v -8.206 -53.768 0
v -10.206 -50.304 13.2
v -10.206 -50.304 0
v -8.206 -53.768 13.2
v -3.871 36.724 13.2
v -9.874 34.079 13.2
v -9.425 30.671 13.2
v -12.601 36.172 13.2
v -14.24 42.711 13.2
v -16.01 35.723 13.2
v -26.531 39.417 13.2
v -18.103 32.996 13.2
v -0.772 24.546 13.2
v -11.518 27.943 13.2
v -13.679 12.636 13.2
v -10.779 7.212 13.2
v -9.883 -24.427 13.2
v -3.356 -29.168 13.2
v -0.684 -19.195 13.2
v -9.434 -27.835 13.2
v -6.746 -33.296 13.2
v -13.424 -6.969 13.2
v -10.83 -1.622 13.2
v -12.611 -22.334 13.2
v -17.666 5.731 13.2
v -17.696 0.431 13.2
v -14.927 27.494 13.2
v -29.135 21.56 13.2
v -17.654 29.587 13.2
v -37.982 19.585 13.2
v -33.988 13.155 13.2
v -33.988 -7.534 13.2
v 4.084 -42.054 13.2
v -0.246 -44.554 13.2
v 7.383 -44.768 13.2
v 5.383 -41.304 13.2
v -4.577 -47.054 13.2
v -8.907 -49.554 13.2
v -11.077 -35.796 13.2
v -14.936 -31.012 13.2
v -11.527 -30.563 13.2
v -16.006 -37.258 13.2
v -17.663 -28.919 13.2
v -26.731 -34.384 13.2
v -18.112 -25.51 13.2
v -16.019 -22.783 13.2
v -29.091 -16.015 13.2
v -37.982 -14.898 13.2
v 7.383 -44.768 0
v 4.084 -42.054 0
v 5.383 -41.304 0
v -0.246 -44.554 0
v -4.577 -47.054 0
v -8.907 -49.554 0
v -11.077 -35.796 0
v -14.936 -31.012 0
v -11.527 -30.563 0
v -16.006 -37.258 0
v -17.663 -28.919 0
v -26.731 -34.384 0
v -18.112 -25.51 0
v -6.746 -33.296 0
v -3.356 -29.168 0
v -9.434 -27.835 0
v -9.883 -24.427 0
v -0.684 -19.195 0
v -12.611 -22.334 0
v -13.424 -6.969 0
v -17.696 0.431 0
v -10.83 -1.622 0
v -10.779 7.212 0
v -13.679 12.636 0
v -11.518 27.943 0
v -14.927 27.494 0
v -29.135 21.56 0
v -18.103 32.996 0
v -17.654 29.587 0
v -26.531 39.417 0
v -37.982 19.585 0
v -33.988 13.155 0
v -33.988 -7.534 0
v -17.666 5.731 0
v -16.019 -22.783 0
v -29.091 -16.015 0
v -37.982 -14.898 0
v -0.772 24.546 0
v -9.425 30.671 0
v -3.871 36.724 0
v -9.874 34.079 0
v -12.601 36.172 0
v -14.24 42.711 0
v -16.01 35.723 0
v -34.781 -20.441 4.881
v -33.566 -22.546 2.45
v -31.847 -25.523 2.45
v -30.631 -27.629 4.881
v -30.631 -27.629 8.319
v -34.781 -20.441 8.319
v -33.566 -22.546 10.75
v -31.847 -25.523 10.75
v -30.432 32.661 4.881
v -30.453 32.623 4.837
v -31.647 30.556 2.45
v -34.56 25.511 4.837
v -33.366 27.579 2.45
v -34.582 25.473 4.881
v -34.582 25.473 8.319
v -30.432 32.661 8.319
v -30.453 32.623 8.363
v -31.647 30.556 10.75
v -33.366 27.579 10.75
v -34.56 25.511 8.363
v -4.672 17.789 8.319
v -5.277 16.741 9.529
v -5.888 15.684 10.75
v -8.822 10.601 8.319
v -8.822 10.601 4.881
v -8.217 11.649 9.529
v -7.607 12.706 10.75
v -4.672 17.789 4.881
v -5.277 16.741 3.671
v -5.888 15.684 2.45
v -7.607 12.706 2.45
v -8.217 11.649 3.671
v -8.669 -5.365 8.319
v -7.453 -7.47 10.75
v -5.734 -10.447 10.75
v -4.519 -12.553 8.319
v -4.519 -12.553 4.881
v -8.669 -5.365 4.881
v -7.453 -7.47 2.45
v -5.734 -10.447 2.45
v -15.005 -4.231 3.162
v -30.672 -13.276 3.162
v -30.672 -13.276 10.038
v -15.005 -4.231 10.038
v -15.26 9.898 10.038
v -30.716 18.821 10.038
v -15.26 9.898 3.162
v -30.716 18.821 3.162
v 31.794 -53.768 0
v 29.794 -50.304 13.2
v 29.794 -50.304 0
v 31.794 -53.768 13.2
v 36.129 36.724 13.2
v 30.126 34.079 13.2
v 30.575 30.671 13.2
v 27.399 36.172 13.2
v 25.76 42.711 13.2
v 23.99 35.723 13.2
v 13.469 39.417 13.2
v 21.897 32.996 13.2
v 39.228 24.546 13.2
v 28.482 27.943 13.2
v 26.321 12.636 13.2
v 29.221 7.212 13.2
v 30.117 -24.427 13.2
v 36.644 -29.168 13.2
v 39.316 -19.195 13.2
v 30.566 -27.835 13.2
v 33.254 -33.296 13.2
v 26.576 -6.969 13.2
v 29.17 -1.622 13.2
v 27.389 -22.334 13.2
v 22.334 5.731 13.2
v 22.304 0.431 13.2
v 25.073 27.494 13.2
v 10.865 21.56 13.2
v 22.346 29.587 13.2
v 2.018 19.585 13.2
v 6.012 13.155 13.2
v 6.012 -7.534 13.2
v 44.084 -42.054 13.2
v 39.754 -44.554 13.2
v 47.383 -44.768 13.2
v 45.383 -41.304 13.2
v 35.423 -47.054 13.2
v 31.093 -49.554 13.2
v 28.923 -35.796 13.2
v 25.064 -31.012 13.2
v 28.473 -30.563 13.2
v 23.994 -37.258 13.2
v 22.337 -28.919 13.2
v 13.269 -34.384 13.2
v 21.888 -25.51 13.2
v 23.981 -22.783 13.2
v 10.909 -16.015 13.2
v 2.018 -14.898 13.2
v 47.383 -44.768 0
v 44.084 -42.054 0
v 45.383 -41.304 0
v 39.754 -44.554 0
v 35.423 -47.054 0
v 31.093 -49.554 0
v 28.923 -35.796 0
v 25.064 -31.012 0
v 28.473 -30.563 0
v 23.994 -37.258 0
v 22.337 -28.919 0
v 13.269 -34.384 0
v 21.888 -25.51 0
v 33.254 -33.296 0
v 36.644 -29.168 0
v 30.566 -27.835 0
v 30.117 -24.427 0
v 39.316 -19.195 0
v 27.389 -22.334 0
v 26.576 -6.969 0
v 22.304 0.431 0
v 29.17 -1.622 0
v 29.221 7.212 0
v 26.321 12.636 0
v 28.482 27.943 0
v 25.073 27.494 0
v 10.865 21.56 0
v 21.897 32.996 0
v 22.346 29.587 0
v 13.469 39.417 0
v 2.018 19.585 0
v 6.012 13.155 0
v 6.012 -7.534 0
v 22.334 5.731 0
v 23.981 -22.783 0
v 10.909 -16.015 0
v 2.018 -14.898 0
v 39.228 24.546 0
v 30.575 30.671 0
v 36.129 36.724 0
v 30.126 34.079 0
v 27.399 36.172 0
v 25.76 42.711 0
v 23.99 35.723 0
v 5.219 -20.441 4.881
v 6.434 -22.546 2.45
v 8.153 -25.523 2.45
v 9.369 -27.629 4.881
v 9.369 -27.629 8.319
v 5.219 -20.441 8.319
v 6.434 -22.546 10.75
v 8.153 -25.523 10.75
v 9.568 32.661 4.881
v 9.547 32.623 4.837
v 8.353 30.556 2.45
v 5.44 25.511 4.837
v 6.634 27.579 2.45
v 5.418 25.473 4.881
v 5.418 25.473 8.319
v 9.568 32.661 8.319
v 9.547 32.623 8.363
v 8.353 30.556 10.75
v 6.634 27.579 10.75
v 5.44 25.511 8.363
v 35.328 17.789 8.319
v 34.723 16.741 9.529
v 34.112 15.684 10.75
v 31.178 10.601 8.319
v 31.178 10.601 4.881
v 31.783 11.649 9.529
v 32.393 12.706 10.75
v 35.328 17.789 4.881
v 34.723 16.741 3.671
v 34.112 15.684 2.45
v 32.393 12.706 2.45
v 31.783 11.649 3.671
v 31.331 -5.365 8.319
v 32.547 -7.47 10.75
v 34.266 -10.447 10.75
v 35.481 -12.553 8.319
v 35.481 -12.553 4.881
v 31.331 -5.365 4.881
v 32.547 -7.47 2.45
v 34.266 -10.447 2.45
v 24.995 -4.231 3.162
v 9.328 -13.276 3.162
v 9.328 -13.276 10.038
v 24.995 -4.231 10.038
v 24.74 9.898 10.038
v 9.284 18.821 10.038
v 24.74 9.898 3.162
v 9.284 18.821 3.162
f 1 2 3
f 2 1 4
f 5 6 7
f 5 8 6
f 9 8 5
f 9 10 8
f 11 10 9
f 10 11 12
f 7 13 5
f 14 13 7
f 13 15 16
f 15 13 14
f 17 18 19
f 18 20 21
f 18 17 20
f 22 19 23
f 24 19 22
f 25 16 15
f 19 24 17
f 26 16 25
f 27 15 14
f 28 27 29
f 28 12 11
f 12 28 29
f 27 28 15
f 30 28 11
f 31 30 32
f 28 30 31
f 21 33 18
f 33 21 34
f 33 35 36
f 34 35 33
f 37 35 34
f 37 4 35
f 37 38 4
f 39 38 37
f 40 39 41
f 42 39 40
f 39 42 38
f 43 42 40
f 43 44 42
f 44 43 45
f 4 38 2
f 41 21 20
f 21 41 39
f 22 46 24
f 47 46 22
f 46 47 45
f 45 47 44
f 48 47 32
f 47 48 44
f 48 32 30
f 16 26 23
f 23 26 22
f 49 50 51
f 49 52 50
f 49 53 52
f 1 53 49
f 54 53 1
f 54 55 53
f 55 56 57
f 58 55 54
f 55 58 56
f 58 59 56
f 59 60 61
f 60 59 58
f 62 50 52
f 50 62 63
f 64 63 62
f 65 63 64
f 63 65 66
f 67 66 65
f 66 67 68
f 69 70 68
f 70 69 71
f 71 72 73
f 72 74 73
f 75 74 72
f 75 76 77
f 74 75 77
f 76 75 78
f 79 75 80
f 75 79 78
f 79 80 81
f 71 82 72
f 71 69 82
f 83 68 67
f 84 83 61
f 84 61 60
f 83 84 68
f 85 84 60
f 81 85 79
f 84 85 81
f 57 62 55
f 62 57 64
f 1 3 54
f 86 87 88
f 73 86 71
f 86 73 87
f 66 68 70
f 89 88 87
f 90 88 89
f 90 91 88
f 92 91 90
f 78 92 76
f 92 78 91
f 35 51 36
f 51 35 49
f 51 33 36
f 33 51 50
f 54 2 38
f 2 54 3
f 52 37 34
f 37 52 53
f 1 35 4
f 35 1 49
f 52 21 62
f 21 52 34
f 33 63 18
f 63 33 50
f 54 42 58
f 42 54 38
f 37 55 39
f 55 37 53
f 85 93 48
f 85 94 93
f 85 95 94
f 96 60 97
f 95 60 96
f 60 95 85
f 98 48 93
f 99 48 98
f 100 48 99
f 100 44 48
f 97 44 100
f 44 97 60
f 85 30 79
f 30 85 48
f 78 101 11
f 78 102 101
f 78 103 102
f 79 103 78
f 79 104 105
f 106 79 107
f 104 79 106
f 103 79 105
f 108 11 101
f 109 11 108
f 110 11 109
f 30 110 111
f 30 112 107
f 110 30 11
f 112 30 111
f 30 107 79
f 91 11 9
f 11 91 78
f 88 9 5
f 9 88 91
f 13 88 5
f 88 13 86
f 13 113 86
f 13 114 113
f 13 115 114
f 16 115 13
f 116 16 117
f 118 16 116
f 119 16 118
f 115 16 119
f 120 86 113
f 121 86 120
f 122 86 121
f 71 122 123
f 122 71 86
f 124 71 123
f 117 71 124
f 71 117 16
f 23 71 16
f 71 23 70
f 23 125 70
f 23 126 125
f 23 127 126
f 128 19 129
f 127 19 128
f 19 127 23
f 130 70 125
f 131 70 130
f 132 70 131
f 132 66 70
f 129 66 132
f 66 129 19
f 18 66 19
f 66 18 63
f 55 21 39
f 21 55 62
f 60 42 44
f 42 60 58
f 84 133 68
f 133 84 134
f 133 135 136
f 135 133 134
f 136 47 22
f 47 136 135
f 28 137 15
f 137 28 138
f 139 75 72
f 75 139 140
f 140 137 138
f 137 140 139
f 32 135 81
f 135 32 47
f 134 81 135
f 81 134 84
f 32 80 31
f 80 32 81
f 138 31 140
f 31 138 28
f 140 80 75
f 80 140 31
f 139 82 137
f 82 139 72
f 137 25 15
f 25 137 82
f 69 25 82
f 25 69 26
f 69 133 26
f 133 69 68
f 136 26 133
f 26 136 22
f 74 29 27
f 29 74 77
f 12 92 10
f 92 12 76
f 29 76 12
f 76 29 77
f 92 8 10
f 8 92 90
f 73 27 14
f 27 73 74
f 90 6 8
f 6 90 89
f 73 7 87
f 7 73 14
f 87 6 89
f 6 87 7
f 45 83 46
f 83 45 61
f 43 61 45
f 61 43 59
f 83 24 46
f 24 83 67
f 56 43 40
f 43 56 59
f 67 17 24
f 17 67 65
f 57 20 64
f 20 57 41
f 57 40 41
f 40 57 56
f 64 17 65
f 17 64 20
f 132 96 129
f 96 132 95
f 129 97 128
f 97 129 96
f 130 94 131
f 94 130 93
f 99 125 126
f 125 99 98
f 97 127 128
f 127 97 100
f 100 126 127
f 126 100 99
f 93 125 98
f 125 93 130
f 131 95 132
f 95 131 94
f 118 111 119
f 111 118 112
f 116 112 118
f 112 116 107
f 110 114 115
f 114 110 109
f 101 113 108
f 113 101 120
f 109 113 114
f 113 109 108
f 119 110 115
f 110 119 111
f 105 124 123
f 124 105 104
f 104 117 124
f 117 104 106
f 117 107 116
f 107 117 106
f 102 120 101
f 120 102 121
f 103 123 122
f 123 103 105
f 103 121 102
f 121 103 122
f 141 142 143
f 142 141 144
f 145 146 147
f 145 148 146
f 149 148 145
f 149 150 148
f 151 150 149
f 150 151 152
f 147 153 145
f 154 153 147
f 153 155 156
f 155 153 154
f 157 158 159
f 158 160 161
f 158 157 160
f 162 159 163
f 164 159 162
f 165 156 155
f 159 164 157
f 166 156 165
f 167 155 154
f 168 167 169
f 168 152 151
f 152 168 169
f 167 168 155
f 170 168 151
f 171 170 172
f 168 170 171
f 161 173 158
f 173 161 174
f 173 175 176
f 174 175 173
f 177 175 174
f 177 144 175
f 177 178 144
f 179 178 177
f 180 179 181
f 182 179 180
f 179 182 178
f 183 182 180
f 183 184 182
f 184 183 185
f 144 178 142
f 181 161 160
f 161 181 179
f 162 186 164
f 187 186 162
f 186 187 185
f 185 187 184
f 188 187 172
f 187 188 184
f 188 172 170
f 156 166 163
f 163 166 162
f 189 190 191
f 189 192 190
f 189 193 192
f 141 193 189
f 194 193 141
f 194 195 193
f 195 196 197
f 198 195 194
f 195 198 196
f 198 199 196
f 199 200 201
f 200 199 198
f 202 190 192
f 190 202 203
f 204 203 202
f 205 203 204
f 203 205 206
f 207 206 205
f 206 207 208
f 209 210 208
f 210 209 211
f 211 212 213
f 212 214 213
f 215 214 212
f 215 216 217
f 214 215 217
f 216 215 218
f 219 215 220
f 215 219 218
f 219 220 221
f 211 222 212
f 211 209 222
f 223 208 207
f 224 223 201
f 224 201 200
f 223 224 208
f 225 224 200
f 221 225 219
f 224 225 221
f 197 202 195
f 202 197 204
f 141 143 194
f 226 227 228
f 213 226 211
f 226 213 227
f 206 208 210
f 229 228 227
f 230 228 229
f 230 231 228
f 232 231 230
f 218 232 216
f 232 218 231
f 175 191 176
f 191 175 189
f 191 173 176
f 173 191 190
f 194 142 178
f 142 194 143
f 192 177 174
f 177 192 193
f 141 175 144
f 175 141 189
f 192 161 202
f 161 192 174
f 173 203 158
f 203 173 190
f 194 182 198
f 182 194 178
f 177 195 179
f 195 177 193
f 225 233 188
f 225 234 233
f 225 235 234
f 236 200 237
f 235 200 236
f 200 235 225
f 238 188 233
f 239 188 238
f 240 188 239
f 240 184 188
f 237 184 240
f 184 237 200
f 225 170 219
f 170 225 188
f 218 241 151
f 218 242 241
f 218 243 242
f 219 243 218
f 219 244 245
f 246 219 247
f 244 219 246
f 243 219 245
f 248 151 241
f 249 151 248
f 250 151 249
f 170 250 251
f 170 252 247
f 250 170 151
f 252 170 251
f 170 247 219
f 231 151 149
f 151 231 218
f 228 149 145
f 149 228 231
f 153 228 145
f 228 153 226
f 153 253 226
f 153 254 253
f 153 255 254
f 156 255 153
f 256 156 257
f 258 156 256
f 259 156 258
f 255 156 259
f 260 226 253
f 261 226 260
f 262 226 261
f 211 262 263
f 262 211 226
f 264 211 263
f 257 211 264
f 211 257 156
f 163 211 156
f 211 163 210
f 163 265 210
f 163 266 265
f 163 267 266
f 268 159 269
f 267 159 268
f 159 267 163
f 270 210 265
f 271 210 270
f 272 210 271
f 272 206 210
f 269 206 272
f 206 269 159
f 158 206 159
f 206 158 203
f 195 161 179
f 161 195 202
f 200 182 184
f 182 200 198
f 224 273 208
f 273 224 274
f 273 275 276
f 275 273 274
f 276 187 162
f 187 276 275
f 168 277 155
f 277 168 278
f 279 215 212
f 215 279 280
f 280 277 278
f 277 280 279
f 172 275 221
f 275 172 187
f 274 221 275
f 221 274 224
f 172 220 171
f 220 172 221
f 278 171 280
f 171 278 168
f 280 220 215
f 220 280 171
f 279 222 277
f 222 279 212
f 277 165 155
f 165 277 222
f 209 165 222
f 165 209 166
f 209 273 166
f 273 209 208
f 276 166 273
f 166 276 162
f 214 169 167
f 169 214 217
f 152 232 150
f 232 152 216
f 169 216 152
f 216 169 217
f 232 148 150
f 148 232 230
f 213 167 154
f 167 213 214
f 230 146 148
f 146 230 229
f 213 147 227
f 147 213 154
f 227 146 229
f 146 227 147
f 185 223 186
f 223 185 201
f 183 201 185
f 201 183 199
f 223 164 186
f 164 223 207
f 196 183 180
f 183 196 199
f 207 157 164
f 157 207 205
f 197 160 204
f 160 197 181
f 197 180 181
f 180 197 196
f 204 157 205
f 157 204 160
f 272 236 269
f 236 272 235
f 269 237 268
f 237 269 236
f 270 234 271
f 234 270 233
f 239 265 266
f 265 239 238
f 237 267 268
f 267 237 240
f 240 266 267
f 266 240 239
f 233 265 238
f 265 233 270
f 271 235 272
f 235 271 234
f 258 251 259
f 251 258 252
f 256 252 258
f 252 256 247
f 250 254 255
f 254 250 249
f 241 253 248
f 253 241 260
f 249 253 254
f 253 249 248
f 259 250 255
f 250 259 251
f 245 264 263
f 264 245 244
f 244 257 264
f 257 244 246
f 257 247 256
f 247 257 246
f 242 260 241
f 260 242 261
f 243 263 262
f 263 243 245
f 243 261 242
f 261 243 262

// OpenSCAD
// file: configuration.scad
// PRUSA Mendel  
// Configuration file
// GNU GPL v2
// Josef Průša
// josefprusa@me.com
// prusadjs.cz
// http://www.reprap.org/wiki/Prusa_Mendel
// http://github.com/prusajr/PrusaMendel

// PLEASE SELECT ONE OF THE CONFIGURATIONS BELOW
// BY UN-COMMENTING IT

variant=0; //0 for metric
//variant=1; //1 for SAE
if(variant==0){
echo("variant: metric");
}else if(variant==1){
echo("variant: sae");
} else{
echo("WARNING: INVALID CONFIGURATION");
}


vars=[
//[m8_dia, m8_nut, m4_dia, m4_nut, m3_dia, m3_nut, bush_dia, mot_shaft, bush_rod, bush_outerdia, bush_length]
[8.3,16.4,4.3,9,3.3,7,11,5.3,8,16,11],//metric
[9,15.7,5.5,10.6,5.5,10.6,11.5,5.3,7.9375,16,11]//SAE
];

//BUSHING TYPE Can generate three versions
// 1 - regular old ones
// 2 - helical ones
// 3 - holders for brass or any other bought bushings
bushing_type = 2;

//Round corner diameter
round_corner_diameter = 8;

//X end parameters
axis_diameter_real = 4;
axis_diameter_larger = 4.2 ;
pressure_pad_height = 0.7;

//Thin wall size
layer_height = 0.4;
perimeter_width_over_thicknes = 1.6;
infill_widht_over_thickness = 1.55;
thin_wall = 2*(perimeter_width_over_thicknes*layer_height+infill_widht_over_thickness*layer_height);
if(thin_wall<2){
	echo("Check thin wall size, its below 2mm!");
}
echo(thin_wall);

//DO NOT TOUCH THIS SECTION!
m8_diameter = vars[variant][0];
m8_nut_diameter = vars[variant][1];
m4_diameter = vars[variant][2];
m4_nut_diameter = vars[variant][3];
m3_diameter = vars[variant][4];
m3_nut_diameter = vars[variant][5];
bushing_diameter = vars[variant][6];
motor_shaft=vars[variant][7];
bushing_rodsize = vars[variant][8];
bushing_outerDiameter = vars[variant][9];
bushing_lenght = vars[variant][10];


// MINI-HUXLEY VERSION (TODO, just place holder)
// include <configuration-huxley.scad>

// MEGA VERSION (TODO, just place holder)
// include <configuration-mega.scad>


// Some basic functions, probably should be somewhere else
module roundcorner(diameter){
	difference(){
		cube(size = [diameter,diameter,99], center = false);
		translate(v = [diameter, diameter, 0]) cylinder(h = 100, r=diameter, center=true);
	}
}
module polyhole(h, d) {
    n = max(round(2 * d),3);
    rotate([0,0,180])
        cylinder(h = h, r = (d / 2) / cos (180 / n), $fn = n);
}
// main file
// PRUSA Mendel  
// Frame vertex
// GNU GPL v2
// Josef Průša
// josefprusa@me.com
// prusadjs.cz
// http://www.reprap.org/wiki/Prusa_Mendel
// http://github.com/prusajr/PrusaMendel

// Based on http://www.thingiverse.com/thing:2003 aka Viks footed 
// frame vertex, which is based on http://www.thingiverse.com/thing:1780 
// aka Tonokps parametric frame vertex
// Thank you guys for your great work
include <configuration.scad>

vfM8=m8_diameter;//+0.9;
vfvertex_height=vfM8+4.9;

vfFN=8;
module vertex(with_foot=true){
//with_foot=1;		// Comment out for no foot.


translate ([58,19,vfvertex_height/2])mirror()difference() 
{
	union () {
		dxf_linear_extrude(file = "vertex-body-fixed-qcad.dxf",height=vfvertex_height,center=true);
		//import_stl("vertex-body-fixed.stl");
		if (with_foot) {
			translate([40,-15,0]) vertex_foot();
		}
	}

	translate([11.013,59.912]) zhole(vfM8); 
	translate([40.274,9.249,0]) zhole(vfM8); 
	translate([40,21,0]) 
		xteardrop(vfM8,40);
	translate([13.687,41.010,0]) rotate(a=60,v=[0,0,1])
		xteardrop(vfM8,62);
	translate([15,17,0])big_hole();
}
}
translate([-15,-60,0]) rotate([0,0,30])
	vertex(true);
translate([25,-60,0]) rotate([0,0,30])
	vertex(true);

module zhole(diameter) #cylinder(h=18,r=(diameter/(2*cos(360/(2*vfFN)))),center=true,$fn=vfFN); 

module xteardrop(diameter,length) rotate(a=-90,v=[0,1,0]) rotate(a=-90,v=[0,0,1]) zteardrop(diameter,length);

module yteardrop(diameter,length) rotate(a=90,v=[1,0,0]) zteardrop(diameter,length);

module zteardrop(diameter,height)
{
	rotate(a=0, v=[0,0,1]) union()
	{
		//translate([0,0,-height/2]) cube(size=[diameter/2,diameter/2,height],center=false);
		rotate(a=22.5, v=[0,0,1])cylinder(r=diameter/(2*cos(360/(2*vfFN))), h = height,center=true,$fn=vfFN);
	}
}

module vertex_foot() {
	difference () {
		union () {
			cube([18,4,vfvertex_height],center=true);
			translate ([-5,8,0]) cube([5,18,vfvertex_height],center=true);
			translate ([5,9,0]) cube([5,18,vfvertex_height],center=true);
		}
		//translate ([0,8,0]) xteardrop(7,200);
	}
}

module big_hole(){
	difference(){
		scale([0.6,0.6,2])dxf_linear_extrude(file = "vertex-body-fixed-qcad.dxf",height=vfvertex_height,center=true);

scale([2,2,2]){translate([0,2,0])xteardrop(vfM8,50);
translate([-2,10,0])rotate(60)xteardrop(vfM8,50);}
}
}
